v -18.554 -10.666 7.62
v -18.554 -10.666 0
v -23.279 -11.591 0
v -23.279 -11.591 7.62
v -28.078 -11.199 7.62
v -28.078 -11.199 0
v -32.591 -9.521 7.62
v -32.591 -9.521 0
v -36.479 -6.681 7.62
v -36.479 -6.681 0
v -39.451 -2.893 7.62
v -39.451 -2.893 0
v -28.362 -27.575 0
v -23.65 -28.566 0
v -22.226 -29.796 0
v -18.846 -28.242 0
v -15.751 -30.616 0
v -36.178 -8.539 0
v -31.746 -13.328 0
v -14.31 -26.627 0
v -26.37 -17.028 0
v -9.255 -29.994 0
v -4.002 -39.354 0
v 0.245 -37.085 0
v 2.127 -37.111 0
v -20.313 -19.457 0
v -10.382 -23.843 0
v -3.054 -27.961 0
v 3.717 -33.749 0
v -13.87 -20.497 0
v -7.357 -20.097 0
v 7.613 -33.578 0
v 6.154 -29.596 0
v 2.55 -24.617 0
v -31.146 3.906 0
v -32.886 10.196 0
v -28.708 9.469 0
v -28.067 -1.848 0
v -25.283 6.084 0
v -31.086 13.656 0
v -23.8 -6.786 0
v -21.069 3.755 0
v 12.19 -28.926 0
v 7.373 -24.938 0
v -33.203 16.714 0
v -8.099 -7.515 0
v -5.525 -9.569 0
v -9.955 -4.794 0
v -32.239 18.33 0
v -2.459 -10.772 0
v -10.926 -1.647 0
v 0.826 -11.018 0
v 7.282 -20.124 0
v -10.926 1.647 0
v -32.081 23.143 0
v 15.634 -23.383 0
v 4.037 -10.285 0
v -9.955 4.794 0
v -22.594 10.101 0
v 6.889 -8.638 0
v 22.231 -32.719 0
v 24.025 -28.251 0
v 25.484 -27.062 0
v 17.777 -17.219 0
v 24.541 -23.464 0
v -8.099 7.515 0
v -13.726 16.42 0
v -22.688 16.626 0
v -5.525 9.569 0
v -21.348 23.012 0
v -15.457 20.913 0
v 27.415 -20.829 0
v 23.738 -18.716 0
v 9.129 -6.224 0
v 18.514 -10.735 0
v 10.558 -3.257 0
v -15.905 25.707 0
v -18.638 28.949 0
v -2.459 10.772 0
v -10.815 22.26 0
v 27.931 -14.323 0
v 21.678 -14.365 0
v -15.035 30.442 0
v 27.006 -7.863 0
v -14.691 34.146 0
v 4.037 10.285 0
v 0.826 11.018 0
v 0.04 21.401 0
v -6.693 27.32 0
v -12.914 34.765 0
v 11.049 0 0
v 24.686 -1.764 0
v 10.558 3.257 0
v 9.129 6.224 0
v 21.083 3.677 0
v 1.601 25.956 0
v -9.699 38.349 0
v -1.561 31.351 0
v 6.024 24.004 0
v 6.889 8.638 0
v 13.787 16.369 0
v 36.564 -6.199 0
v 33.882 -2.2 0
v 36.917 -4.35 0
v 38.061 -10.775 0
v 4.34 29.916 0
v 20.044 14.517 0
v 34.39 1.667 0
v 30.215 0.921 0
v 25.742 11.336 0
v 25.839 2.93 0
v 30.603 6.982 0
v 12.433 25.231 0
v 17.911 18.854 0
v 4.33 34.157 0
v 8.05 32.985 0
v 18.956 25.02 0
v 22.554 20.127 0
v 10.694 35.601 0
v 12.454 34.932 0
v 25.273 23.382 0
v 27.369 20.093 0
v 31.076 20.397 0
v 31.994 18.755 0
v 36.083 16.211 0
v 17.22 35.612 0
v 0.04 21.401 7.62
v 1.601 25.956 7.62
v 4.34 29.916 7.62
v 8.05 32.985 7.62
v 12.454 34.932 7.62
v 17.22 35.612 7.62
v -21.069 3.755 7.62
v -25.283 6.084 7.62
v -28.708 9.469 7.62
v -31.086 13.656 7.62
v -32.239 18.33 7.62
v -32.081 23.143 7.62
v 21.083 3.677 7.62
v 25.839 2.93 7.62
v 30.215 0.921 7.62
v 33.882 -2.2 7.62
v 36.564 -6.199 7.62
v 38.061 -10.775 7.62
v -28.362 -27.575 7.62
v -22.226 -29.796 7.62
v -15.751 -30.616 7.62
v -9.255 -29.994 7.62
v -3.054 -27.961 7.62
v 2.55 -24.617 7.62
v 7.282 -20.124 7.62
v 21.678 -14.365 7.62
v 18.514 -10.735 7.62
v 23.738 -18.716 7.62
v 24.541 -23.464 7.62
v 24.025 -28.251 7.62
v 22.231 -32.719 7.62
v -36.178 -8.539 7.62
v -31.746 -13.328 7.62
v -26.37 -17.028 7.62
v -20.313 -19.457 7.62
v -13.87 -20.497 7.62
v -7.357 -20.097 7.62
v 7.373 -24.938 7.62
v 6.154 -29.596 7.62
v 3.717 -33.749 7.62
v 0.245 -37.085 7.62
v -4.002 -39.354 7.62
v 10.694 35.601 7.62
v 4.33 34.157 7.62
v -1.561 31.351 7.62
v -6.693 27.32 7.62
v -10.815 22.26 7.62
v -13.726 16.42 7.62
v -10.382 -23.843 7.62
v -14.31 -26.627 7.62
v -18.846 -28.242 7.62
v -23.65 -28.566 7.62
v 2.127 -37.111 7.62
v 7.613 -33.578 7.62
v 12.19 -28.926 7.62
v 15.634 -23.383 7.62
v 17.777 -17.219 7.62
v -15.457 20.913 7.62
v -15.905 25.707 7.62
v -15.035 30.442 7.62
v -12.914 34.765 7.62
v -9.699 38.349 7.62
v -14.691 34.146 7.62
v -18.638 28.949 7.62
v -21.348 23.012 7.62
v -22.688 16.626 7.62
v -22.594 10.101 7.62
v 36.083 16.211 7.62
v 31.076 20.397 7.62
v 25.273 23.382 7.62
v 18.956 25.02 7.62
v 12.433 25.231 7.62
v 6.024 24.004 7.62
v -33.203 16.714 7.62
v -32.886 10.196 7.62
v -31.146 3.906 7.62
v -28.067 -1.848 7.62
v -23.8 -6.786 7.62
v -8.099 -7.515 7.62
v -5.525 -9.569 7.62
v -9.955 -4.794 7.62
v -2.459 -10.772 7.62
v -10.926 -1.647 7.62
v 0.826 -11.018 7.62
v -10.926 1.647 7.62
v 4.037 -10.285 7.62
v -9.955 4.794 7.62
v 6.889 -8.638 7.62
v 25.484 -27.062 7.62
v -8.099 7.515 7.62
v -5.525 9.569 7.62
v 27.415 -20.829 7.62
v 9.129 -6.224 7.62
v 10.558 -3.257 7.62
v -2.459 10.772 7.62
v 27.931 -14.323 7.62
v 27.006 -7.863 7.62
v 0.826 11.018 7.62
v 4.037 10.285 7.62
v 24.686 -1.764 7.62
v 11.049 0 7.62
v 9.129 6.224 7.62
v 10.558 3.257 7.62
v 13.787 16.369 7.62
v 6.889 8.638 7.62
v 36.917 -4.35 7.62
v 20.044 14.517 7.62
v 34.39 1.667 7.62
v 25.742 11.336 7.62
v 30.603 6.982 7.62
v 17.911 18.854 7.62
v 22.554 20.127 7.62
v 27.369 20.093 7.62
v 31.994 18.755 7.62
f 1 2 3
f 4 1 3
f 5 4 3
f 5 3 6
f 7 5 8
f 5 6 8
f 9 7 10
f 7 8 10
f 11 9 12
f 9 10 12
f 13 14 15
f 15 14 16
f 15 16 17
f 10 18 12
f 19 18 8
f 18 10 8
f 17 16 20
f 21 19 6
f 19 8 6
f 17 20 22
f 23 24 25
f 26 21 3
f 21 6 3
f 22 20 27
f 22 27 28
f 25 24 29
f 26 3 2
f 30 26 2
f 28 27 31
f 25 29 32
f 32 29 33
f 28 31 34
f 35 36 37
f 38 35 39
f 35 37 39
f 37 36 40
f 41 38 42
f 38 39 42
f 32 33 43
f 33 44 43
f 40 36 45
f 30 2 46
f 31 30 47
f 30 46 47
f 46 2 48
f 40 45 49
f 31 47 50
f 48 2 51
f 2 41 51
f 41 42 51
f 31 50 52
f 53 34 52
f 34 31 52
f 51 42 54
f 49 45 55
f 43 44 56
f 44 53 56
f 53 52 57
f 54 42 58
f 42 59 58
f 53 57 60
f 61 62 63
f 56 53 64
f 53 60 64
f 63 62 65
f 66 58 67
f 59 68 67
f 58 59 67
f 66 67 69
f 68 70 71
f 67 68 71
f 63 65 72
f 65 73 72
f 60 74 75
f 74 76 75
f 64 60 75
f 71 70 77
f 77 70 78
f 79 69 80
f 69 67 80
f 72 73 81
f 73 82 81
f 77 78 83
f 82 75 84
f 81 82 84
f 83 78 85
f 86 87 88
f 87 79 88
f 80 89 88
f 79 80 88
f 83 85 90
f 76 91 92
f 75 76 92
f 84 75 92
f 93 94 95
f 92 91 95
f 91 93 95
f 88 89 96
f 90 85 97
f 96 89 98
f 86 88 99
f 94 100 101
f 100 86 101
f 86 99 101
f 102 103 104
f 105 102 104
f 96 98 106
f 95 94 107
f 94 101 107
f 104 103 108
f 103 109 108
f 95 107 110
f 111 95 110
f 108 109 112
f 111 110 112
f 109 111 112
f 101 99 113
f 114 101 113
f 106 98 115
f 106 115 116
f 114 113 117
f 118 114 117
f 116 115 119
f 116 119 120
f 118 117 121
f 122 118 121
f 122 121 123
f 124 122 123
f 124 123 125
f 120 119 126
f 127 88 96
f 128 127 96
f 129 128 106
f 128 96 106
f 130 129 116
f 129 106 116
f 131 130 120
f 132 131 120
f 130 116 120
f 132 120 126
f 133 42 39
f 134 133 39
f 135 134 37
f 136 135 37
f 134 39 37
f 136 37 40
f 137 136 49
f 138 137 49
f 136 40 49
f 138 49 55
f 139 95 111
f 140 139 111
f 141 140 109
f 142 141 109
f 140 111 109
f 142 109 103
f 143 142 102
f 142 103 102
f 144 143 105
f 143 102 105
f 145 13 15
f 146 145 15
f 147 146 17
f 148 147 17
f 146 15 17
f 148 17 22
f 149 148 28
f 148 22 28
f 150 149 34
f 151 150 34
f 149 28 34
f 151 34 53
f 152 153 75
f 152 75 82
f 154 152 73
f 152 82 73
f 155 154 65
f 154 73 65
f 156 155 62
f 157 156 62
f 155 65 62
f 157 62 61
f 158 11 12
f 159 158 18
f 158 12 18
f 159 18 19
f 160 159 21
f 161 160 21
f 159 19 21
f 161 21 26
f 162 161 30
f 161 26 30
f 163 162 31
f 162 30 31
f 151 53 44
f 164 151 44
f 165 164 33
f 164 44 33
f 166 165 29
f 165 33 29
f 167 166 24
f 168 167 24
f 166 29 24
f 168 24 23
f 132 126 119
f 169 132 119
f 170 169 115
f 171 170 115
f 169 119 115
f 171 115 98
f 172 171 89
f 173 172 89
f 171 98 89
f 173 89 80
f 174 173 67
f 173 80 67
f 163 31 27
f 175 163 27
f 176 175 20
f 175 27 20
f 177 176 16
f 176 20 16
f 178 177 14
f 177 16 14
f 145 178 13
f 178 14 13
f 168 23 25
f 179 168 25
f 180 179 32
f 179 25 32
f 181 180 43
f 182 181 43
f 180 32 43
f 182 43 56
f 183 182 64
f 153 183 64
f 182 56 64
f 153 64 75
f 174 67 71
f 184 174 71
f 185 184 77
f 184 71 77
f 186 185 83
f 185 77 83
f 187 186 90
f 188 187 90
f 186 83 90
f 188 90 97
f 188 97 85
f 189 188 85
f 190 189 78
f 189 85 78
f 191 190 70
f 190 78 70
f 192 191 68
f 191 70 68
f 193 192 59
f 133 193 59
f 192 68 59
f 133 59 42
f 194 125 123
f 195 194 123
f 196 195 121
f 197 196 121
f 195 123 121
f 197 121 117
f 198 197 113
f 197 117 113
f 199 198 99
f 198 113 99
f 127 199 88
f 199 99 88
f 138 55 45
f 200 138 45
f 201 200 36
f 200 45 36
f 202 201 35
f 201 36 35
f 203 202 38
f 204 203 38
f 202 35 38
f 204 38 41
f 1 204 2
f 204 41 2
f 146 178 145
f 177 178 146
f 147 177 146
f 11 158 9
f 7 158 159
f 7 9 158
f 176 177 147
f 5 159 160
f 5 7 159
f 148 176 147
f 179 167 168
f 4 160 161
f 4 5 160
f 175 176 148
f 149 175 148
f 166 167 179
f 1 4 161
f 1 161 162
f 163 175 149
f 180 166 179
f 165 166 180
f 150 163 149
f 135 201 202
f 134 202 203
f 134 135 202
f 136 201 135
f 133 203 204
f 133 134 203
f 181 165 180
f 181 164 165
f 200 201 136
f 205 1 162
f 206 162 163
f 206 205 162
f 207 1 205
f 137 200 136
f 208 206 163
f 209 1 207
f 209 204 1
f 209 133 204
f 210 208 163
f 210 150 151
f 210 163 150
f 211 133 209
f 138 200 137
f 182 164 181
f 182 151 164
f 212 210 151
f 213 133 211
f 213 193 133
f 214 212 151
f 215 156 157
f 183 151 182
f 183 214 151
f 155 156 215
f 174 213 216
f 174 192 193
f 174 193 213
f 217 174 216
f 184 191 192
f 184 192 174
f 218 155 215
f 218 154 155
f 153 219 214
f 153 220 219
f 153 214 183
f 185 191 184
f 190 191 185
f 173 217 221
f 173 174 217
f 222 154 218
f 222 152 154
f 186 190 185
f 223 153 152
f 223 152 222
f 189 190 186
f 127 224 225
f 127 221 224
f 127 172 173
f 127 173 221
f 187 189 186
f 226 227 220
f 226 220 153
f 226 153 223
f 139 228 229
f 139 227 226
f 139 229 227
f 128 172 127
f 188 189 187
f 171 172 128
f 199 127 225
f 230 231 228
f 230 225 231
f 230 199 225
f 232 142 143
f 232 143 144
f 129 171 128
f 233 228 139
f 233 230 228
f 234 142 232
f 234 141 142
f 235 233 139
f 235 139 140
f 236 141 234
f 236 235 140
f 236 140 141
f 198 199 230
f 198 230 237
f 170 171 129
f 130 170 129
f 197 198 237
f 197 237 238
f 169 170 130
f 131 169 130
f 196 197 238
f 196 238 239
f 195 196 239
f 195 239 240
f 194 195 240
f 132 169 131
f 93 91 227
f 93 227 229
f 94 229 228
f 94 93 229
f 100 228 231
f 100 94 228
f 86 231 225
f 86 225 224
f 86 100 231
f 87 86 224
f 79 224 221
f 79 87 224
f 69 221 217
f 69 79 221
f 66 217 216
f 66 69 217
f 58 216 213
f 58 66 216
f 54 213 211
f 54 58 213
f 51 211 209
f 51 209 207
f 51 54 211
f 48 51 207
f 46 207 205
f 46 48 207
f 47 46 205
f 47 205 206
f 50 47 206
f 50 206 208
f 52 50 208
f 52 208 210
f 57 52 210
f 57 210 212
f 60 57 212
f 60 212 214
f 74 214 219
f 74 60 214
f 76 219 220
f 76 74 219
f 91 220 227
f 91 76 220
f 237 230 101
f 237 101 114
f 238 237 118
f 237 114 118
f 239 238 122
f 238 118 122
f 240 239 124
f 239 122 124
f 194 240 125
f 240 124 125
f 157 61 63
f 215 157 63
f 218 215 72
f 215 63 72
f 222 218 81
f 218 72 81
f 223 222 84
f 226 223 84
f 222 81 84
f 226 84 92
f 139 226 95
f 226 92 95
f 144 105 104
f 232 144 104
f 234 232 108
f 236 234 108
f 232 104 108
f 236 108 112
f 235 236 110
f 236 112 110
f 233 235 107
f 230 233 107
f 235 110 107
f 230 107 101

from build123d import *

# Parameters (mm, degrees)
F0_R     = 11.049
F1_DEPTH = 7.62


with BuildPart() as f1:
    # F0 (on Top) → F1 (new body)
    with BuildSketch(Plane.XY):
        with BuildLine():
            ThreePointArc((0.039662, 21.40109), (6.089549, 31.577889), (17.220307, 35.612065))
            ThreePointArc((17.220307, 35.612065), (-1.561389, 31.350671), (-13.725973, 16.41968))
            ThreePointArc((-13.725973, 16.41968), (-15.633011, 28.104353), (-9.699474, 38.349425))
            ThreePointArc((-9.699474, 38.349425), (-21.347916, 23.012366), (-21.069072, 3.755319))
            ThreePointArc((-21.069072, 3.755319), (-30.040711, 11.480478), (-32.080763, 23.142662))
            ThreePointArc((-32.080763, 23.142662), (-31.145516, 3.906319), (-18.553719, -10.666197))
            ThreePointArc((-18.553719, -10.666197), (-30.392028, -10.51524), (-39.451107, -2.892809))
            ThreePointArc((-39.451107, -2.892809), (-26.369783, -17.027538), (-7.356874, -20.096881))
            ThreePointArc((-7.356874, -20.096881), (-16.522578, -27.590761), (-28.361839, -27.574703))
            ThreePointArc((-28.361839, -27.574703), (-9.255335, -29.994021), (7.282334, -20.124012))
            ThreePointArc((7.282334, -20.124012), (5.07797, -31.756257), (-4.001752, -39.354087))
            ThreePointArc((-4.001752, -39.354087), (12.189787, -28.925968), (18.514057, -10.734893))
            ThreePointArc((18.514057, -10.734893), (24.302479, -21.062648), (22.2308, -32.719256))
            ThreePointArc((22.2308, -32.719256), (27.931172, -14.323133), (21.082847, 3.677201))
            ThreePointArc((21.082847, 3.677201), (32.155589, -0.513592), (38.061313, -10.774722))
            ThreePointArc((38.061313, -10.774722), (30.603252, 6.981655), (13.786738, 16.368692))
            ThreePointArc((13.786738, 16.368692), (24.962741, 20.27578), (36.082515, 16.211425))
            ThreePointArc((36.082515, 16.211425), (18.95573, 25.019649), (0.039662, 21.40109))
        make_face()
        Circle(F0_R, mode=Mode.SUBTRACT)
    extrude(amount=F1_DEPTH)


solid = f1.part
